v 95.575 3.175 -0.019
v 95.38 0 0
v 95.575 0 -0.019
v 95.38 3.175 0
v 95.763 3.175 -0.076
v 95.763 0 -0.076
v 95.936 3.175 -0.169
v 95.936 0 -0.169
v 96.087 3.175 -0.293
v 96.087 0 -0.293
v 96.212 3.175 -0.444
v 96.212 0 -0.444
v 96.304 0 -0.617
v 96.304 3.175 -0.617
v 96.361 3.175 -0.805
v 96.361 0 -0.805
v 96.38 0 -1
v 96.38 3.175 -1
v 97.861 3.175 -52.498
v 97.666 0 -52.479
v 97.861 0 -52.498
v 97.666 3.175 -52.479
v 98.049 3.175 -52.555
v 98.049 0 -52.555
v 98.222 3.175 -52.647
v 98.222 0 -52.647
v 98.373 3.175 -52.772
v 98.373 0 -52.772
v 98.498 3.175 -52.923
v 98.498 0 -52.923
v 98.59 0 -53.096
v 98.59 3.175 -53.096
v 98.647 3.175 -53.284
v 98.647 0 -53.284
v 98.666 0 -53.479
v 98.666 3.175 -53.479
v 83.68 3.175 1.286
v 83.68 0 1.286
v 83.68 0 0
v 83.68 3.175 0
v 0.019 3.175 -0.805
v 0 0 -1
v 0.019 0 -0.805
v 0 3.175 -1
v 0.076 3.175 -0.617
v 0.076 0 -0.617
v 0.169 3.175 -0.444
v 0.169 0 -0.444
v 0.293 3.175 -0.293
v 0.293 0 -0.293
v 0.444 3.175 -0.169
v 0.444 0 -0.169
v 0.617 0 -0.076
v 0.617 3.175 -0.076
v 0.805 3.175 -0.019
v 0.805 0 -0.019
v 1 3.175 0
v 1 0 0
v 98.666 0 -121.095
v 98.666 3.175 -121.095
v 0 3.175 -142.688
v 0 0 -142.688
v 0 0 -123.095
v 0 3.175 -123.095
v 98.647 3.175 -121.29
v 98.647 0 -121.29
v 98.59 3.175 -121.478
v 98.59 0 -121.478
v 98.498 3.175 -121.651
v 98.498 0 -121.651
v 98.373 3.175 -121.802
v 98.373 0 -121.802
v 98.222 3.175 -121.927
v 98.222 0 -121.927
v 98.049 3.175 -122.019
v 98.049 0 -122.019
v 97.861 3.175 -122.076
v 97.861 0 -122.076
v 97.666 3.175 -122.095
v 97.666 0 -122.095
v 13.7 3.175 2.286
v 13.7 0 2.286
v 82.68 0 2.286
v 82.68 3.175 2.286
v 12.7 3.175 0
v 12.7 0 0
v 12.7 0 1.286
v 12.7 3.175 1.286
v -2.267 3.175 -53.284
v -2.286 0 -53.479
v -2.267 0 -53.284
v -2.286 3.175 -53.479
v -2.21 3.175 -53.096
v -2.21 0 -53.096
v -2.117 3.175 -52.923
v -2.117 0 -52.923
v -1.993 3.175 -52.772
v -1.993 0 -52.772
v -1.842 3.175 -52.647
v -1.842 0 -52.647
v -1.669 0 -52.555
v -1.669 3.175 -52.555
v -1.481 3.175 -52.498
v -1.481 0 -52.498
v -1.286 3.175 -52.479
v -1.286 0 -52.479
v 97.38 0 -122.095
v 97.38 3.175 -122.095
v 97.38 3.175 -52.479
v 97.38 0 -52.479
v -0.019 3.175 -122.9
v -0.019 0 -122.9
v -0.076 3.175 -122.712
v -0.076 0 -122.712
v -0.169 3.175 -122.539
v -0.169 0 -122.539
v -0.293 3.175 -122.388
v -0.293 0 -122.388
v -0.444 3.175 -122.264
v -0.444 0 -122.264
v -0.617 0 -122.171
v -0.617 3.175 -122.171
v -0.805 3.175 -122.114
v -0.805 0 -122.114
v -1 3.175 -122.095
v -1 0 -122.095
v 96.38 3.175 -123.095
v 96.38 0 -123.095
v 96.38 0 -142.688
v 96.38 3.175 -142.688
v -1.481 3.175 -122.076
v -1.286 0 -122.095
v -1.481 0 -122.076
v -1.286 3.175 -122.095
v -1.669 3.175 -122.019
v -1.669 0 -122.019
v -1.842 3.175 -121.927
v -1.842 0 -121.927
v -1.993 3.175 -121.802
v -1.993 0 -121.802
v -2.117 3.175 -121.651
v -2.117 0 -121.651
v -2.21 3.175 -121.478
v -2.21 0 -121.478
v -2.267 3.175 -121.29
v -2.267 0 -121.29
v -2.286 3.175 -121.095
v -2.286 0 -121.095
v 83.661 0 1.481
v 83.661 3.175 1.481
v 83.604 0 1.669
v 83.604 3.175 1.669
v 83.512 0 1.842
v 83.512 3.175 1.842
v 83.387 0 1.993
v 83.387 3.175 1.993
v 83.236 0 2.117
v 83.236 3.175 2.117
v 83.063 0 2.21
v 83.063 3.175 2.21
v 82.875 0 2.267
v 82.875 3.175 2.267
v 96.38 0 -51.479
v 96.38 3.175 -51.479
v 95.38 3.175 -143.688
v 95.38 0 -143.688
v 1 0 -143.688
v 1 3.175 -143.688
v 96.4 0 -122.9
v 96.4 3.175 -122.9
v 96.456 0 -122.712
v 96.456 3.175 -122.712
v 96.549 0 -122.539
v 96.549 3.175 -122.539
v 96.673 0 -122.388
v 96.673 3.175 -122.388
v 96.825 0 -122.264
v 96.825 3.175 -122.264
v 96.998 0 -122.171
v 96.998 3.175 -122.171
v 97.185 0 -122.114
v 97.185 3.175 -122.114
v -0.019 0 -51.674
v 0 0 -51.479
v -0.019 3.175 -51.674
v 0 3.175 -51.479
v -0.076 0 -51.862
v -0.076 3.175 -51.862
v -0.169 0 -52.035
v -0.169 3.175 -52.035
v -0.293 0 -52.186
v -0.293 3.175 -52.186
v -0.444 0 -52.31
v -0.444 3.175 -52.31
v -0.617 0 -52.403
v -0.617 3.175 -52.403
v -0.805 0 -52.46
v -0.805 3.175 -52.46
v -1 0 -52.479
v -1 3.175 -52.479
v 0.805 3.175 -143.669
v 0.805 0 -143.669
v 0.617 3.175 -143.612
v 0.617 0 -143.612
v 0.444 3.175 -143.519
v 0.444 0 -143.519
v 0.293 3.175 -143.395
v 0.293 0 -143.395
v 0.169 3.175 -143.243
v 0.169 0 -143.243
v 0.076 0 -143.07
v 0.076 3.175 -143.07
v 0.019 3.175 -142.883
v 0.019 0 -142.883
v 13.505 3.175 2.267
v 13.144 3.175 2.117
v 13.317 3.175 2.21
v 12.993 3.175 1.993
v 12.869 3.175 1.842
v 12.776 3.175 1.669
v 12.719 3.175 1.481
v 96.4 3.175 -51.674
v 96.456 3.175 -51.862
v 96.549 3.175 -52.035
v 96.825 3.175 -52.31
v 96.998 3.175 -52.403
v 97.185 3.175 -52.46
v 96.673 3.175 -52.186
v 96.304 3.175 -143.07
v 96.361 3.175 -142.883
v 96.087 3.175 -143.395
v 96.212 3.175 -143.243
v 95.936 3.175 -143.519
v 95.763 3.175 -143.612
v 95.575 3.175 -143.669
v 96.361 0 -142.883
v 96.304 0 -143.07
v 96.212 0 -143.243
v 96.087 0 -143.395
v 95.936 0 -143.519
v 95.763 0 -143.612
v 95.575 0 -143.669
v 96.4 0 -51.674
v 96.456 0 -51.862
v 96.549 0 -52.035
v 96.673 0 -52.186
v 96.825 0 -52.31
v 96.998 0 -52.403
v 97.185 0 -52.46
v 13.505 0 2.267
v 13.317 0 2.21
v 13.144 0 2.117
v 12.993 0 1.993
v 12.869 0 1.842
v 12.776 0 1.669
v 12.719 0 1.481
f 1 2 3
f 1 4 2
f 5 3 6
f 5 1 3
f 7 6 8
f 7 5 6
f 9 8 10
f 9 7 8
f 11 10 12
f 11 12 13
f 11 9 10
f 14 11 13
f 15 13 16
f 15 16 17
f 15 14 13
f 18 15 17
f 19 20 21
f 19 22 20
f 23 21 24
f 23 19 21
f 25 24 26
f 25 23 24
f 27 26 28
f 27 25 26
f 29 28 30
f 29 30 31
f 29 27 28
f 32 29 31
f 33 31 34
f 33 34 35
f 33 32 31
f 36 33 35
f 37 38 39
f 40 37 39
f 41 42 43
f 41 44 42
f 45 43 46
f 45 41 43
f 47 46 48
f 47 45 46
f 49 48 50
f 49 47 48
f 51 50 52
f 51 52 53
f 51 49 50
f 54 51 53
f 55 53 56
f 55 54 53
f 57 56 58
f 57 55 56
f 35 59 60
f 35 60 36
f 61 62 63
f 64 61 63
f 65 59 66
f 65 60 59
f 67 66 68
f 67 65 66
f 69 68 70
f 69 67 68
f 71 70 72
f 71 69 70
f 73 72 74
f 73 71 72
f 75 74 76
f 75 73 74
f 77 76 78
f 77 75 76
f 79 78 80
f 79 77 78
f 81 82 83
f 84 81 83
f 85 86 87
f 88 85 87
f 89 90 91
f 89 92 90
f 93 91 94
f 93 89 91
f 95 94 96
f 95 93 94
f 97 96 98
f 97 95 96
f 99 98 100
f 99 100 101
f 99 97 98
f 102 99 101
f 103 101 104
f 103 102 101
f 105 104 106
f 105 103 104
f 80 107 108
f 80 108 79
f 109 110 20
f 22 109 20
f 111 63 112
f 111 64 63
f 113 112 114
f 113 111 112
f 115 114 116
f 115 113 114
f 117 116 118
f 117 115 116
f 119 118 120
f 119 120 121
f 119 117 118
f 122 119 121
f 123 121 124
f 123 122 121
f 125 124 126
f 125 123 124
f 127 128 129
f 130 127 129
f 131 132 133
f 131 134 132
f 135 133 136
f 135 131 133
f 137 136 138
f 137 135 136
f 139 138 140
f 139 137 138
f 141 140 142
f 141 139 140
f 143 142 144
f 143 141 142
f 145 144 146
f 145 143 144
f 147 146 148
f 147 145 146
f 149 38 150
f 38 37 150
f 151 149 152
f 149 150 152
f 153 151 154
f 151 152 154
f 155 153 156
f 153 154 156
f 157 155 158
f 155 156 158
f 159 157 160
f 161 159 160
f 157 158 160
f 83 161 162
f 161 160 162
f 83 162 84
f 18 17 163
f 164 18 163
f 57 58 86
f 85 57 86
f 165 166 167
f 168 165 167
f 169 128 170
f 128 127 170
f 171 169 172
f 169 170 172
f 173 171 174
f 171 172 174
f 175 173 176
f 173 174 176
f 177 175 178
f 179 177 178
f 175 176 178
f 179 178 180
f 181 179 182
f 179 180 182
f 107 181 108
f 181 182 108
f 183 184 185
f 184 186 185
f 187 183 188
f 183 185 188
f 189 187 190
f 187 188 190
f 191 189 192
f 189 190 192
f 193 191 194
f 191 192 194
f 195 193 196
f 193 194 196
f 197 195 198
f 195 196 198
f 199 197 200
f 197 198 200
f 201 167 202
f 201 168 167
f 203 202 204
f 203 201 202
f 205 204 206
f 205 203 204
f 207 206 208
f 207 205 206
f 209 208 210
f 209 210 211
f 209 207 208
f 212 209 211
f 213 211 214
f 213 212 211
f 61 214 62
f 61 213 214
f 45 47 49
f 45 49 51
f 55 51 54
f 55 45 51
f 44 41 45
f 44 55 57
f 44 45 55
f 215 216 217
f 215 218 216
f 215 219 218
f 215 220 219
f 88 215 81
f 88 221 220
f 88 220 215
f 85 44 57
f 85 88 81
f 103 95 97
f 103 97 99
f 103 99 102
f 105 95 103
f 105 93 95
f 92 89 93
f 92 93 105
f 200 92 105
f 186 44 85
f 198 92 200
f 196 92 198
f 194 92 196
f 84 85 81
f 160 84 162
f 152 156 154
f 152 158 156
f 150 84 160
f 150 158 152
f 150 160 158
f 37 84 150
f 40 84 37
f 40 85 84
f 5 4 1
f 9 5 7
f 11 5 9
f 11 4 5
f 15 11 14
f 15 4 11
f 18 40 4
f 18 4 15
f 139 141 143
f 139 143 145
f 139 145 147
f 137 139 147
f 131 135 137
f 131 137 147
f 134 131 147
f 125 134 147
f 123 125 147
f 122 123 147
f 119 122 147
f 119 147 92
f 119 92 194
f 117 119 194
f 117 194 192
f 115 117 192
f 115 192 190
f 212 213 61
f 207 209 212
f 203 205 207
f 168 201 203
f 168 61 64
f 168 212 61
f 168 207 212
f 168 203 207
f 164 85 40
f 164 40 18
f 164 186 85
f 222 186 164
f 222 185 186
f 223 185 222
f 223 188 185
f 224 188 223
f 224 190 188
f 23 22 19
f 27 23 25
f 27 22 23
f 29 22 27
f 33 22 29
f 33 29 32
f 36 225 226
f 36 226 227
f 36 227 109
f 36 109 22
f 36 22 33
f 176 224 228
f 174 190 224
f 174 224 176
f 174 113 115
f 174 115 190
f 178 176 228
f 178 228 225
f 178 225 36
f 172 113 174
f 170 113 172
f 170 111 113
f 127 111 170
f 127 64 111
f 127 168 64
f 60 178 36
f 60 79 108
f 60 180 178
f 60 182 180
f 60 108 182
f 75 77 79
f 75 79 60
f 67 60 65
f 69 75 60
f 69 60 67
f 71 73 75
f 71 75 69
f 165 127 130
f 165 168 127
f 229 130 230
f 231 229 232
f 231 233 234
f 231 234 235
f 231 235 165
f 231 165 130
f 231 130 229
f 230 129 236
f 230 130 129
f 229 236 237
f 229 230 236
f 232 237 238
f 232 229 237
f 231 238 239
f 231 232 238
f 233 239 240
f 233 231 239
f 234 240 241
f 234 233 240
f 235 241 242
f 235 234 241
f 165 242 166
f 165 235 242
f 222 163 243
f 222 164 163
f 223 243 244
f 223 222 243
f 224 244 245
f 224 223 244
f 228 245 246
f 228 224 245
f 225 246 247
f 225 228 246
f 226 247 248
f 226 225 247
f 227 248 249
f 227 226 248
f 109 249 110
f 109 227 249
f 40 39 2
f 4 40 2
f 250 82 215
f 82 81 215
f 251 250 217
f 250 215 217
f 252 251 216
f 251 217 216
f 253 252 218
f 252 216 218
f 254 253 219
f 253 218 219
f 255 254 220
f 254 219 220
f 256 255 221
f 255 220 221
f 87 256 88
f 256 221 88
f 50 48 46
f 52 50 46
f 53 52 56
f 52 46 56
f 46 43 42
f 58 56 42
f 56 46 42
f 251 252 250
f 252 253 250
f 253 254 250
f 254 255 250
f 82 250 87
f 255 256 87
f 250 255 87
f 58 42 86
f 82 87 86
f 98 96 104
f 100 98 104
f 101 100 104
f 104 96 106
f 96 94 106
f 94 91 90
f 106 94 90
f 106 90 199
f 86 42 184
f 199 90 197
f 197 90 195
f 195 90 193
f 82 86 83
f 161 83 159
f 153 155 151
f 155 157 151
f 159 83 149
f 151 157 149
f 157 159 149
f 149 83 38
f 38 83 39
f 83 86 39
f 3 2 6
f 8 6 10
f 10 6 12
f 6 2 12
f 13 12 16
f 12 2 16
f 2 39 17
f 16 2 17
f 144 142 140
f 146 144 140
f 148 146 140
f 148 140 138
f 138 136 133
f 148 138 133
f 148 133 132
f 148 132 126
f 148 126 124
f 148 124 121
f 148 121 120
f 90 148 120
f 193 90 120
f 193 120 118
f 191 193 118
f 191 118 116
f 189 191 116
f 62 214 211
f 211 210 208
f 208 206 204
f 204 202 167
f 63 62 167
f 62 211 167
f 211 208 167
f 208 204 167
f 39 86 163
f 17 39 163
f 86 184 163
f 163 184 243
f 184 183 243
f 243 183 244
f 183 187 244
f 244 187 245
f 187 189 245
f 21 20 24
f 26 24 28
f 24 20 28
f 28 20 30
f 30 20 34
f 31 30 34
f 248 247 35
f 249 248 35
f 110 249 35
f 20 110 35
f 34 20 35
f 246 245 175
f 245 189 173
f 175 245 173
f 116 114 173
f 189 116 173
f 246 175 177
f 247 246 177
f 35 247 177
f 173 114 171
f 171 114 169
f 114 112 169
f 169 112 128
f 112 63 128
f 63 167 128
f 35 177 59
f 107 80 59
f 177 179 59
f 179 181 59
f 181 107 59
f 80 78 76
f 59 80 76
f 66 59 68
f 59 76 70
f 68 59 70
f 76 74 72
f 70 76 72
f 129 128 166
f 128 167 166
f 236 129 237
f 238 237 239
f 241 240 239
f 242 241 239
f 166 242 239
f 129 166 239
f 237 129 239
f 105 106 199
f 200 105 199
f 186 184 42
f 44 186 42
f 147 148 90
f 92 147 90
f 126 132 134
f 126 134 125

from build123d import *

# Parameters (mm, degrees)
BOSS_EXTRUDE1_DEPTH = 3.175
SKETCH2_W           = 2.286
SKETCH2_H           = 69.616100292
BOSS_EXTRUDE2_DEPTH = 3.175
FILLET1_R           = 1


with BuildPart() as part:
    # Sketch1 → Boss-Extrude1 (new body)
    with BuildSketch(Plane(origin=(0, 0, 0), x_dir=(1, 0, 0), z_dir=(0, 1, 0))):
        Polygon((83.6803, 0), (96.3803, 0), (96.3803, 143.6878), (0, 143.6878), (0, 0), (12.7, 0), (12.7, -2.286), (83.6803, -2.286), align=None)
    extrude(amount=BOSS_EXTRUDE1_DEPTH)

    # Sketch2 → Boss-Extrude2 (add, through all)
    with BuildSketch(Plane.XZ):
        with Locations((-1.143, -87.286990146)):
            Rectangle(SKETCH2_W, SKETCH2_H)
        with Locations((97.5233, -87.286990146)):
            Rectangle(SKETCH2_W, SKETCH2_H)
    extrude(amount=-BOSS_EXTRUDE2_DEPTH)

    # Fillet1
    fillet1_edges = [part.edges().sort_by_distance(p)[0] for p in [
        (0, 1.5875, -143.6878),
        (96.3803, 1.5875, -143.6878),
        (96.3803, 1.5875, 0),
        (83.6803, 1.5875, 2.286),
        (12.7, 1.5875, 2.286),
        (0, 1.5875, 0),
        (0, 1.5875, -52.47894),
        (0, 1.5875, -122.095040292),
        (-2.286, 1.5875, -122.095040292),
        (-2.286, 1.5875, -52.47894),
        (96.3803, 1.5875, -122.095040292),
        (96.3803, 1.5875, -52.47894),
        (98.6663, 1.5875, -52.47894),
        (98.6663, 1.5875, -122.095040292),
    ]]
    fillet(fillet1_edges, radius=FILLET1_R)


solid = part.part
